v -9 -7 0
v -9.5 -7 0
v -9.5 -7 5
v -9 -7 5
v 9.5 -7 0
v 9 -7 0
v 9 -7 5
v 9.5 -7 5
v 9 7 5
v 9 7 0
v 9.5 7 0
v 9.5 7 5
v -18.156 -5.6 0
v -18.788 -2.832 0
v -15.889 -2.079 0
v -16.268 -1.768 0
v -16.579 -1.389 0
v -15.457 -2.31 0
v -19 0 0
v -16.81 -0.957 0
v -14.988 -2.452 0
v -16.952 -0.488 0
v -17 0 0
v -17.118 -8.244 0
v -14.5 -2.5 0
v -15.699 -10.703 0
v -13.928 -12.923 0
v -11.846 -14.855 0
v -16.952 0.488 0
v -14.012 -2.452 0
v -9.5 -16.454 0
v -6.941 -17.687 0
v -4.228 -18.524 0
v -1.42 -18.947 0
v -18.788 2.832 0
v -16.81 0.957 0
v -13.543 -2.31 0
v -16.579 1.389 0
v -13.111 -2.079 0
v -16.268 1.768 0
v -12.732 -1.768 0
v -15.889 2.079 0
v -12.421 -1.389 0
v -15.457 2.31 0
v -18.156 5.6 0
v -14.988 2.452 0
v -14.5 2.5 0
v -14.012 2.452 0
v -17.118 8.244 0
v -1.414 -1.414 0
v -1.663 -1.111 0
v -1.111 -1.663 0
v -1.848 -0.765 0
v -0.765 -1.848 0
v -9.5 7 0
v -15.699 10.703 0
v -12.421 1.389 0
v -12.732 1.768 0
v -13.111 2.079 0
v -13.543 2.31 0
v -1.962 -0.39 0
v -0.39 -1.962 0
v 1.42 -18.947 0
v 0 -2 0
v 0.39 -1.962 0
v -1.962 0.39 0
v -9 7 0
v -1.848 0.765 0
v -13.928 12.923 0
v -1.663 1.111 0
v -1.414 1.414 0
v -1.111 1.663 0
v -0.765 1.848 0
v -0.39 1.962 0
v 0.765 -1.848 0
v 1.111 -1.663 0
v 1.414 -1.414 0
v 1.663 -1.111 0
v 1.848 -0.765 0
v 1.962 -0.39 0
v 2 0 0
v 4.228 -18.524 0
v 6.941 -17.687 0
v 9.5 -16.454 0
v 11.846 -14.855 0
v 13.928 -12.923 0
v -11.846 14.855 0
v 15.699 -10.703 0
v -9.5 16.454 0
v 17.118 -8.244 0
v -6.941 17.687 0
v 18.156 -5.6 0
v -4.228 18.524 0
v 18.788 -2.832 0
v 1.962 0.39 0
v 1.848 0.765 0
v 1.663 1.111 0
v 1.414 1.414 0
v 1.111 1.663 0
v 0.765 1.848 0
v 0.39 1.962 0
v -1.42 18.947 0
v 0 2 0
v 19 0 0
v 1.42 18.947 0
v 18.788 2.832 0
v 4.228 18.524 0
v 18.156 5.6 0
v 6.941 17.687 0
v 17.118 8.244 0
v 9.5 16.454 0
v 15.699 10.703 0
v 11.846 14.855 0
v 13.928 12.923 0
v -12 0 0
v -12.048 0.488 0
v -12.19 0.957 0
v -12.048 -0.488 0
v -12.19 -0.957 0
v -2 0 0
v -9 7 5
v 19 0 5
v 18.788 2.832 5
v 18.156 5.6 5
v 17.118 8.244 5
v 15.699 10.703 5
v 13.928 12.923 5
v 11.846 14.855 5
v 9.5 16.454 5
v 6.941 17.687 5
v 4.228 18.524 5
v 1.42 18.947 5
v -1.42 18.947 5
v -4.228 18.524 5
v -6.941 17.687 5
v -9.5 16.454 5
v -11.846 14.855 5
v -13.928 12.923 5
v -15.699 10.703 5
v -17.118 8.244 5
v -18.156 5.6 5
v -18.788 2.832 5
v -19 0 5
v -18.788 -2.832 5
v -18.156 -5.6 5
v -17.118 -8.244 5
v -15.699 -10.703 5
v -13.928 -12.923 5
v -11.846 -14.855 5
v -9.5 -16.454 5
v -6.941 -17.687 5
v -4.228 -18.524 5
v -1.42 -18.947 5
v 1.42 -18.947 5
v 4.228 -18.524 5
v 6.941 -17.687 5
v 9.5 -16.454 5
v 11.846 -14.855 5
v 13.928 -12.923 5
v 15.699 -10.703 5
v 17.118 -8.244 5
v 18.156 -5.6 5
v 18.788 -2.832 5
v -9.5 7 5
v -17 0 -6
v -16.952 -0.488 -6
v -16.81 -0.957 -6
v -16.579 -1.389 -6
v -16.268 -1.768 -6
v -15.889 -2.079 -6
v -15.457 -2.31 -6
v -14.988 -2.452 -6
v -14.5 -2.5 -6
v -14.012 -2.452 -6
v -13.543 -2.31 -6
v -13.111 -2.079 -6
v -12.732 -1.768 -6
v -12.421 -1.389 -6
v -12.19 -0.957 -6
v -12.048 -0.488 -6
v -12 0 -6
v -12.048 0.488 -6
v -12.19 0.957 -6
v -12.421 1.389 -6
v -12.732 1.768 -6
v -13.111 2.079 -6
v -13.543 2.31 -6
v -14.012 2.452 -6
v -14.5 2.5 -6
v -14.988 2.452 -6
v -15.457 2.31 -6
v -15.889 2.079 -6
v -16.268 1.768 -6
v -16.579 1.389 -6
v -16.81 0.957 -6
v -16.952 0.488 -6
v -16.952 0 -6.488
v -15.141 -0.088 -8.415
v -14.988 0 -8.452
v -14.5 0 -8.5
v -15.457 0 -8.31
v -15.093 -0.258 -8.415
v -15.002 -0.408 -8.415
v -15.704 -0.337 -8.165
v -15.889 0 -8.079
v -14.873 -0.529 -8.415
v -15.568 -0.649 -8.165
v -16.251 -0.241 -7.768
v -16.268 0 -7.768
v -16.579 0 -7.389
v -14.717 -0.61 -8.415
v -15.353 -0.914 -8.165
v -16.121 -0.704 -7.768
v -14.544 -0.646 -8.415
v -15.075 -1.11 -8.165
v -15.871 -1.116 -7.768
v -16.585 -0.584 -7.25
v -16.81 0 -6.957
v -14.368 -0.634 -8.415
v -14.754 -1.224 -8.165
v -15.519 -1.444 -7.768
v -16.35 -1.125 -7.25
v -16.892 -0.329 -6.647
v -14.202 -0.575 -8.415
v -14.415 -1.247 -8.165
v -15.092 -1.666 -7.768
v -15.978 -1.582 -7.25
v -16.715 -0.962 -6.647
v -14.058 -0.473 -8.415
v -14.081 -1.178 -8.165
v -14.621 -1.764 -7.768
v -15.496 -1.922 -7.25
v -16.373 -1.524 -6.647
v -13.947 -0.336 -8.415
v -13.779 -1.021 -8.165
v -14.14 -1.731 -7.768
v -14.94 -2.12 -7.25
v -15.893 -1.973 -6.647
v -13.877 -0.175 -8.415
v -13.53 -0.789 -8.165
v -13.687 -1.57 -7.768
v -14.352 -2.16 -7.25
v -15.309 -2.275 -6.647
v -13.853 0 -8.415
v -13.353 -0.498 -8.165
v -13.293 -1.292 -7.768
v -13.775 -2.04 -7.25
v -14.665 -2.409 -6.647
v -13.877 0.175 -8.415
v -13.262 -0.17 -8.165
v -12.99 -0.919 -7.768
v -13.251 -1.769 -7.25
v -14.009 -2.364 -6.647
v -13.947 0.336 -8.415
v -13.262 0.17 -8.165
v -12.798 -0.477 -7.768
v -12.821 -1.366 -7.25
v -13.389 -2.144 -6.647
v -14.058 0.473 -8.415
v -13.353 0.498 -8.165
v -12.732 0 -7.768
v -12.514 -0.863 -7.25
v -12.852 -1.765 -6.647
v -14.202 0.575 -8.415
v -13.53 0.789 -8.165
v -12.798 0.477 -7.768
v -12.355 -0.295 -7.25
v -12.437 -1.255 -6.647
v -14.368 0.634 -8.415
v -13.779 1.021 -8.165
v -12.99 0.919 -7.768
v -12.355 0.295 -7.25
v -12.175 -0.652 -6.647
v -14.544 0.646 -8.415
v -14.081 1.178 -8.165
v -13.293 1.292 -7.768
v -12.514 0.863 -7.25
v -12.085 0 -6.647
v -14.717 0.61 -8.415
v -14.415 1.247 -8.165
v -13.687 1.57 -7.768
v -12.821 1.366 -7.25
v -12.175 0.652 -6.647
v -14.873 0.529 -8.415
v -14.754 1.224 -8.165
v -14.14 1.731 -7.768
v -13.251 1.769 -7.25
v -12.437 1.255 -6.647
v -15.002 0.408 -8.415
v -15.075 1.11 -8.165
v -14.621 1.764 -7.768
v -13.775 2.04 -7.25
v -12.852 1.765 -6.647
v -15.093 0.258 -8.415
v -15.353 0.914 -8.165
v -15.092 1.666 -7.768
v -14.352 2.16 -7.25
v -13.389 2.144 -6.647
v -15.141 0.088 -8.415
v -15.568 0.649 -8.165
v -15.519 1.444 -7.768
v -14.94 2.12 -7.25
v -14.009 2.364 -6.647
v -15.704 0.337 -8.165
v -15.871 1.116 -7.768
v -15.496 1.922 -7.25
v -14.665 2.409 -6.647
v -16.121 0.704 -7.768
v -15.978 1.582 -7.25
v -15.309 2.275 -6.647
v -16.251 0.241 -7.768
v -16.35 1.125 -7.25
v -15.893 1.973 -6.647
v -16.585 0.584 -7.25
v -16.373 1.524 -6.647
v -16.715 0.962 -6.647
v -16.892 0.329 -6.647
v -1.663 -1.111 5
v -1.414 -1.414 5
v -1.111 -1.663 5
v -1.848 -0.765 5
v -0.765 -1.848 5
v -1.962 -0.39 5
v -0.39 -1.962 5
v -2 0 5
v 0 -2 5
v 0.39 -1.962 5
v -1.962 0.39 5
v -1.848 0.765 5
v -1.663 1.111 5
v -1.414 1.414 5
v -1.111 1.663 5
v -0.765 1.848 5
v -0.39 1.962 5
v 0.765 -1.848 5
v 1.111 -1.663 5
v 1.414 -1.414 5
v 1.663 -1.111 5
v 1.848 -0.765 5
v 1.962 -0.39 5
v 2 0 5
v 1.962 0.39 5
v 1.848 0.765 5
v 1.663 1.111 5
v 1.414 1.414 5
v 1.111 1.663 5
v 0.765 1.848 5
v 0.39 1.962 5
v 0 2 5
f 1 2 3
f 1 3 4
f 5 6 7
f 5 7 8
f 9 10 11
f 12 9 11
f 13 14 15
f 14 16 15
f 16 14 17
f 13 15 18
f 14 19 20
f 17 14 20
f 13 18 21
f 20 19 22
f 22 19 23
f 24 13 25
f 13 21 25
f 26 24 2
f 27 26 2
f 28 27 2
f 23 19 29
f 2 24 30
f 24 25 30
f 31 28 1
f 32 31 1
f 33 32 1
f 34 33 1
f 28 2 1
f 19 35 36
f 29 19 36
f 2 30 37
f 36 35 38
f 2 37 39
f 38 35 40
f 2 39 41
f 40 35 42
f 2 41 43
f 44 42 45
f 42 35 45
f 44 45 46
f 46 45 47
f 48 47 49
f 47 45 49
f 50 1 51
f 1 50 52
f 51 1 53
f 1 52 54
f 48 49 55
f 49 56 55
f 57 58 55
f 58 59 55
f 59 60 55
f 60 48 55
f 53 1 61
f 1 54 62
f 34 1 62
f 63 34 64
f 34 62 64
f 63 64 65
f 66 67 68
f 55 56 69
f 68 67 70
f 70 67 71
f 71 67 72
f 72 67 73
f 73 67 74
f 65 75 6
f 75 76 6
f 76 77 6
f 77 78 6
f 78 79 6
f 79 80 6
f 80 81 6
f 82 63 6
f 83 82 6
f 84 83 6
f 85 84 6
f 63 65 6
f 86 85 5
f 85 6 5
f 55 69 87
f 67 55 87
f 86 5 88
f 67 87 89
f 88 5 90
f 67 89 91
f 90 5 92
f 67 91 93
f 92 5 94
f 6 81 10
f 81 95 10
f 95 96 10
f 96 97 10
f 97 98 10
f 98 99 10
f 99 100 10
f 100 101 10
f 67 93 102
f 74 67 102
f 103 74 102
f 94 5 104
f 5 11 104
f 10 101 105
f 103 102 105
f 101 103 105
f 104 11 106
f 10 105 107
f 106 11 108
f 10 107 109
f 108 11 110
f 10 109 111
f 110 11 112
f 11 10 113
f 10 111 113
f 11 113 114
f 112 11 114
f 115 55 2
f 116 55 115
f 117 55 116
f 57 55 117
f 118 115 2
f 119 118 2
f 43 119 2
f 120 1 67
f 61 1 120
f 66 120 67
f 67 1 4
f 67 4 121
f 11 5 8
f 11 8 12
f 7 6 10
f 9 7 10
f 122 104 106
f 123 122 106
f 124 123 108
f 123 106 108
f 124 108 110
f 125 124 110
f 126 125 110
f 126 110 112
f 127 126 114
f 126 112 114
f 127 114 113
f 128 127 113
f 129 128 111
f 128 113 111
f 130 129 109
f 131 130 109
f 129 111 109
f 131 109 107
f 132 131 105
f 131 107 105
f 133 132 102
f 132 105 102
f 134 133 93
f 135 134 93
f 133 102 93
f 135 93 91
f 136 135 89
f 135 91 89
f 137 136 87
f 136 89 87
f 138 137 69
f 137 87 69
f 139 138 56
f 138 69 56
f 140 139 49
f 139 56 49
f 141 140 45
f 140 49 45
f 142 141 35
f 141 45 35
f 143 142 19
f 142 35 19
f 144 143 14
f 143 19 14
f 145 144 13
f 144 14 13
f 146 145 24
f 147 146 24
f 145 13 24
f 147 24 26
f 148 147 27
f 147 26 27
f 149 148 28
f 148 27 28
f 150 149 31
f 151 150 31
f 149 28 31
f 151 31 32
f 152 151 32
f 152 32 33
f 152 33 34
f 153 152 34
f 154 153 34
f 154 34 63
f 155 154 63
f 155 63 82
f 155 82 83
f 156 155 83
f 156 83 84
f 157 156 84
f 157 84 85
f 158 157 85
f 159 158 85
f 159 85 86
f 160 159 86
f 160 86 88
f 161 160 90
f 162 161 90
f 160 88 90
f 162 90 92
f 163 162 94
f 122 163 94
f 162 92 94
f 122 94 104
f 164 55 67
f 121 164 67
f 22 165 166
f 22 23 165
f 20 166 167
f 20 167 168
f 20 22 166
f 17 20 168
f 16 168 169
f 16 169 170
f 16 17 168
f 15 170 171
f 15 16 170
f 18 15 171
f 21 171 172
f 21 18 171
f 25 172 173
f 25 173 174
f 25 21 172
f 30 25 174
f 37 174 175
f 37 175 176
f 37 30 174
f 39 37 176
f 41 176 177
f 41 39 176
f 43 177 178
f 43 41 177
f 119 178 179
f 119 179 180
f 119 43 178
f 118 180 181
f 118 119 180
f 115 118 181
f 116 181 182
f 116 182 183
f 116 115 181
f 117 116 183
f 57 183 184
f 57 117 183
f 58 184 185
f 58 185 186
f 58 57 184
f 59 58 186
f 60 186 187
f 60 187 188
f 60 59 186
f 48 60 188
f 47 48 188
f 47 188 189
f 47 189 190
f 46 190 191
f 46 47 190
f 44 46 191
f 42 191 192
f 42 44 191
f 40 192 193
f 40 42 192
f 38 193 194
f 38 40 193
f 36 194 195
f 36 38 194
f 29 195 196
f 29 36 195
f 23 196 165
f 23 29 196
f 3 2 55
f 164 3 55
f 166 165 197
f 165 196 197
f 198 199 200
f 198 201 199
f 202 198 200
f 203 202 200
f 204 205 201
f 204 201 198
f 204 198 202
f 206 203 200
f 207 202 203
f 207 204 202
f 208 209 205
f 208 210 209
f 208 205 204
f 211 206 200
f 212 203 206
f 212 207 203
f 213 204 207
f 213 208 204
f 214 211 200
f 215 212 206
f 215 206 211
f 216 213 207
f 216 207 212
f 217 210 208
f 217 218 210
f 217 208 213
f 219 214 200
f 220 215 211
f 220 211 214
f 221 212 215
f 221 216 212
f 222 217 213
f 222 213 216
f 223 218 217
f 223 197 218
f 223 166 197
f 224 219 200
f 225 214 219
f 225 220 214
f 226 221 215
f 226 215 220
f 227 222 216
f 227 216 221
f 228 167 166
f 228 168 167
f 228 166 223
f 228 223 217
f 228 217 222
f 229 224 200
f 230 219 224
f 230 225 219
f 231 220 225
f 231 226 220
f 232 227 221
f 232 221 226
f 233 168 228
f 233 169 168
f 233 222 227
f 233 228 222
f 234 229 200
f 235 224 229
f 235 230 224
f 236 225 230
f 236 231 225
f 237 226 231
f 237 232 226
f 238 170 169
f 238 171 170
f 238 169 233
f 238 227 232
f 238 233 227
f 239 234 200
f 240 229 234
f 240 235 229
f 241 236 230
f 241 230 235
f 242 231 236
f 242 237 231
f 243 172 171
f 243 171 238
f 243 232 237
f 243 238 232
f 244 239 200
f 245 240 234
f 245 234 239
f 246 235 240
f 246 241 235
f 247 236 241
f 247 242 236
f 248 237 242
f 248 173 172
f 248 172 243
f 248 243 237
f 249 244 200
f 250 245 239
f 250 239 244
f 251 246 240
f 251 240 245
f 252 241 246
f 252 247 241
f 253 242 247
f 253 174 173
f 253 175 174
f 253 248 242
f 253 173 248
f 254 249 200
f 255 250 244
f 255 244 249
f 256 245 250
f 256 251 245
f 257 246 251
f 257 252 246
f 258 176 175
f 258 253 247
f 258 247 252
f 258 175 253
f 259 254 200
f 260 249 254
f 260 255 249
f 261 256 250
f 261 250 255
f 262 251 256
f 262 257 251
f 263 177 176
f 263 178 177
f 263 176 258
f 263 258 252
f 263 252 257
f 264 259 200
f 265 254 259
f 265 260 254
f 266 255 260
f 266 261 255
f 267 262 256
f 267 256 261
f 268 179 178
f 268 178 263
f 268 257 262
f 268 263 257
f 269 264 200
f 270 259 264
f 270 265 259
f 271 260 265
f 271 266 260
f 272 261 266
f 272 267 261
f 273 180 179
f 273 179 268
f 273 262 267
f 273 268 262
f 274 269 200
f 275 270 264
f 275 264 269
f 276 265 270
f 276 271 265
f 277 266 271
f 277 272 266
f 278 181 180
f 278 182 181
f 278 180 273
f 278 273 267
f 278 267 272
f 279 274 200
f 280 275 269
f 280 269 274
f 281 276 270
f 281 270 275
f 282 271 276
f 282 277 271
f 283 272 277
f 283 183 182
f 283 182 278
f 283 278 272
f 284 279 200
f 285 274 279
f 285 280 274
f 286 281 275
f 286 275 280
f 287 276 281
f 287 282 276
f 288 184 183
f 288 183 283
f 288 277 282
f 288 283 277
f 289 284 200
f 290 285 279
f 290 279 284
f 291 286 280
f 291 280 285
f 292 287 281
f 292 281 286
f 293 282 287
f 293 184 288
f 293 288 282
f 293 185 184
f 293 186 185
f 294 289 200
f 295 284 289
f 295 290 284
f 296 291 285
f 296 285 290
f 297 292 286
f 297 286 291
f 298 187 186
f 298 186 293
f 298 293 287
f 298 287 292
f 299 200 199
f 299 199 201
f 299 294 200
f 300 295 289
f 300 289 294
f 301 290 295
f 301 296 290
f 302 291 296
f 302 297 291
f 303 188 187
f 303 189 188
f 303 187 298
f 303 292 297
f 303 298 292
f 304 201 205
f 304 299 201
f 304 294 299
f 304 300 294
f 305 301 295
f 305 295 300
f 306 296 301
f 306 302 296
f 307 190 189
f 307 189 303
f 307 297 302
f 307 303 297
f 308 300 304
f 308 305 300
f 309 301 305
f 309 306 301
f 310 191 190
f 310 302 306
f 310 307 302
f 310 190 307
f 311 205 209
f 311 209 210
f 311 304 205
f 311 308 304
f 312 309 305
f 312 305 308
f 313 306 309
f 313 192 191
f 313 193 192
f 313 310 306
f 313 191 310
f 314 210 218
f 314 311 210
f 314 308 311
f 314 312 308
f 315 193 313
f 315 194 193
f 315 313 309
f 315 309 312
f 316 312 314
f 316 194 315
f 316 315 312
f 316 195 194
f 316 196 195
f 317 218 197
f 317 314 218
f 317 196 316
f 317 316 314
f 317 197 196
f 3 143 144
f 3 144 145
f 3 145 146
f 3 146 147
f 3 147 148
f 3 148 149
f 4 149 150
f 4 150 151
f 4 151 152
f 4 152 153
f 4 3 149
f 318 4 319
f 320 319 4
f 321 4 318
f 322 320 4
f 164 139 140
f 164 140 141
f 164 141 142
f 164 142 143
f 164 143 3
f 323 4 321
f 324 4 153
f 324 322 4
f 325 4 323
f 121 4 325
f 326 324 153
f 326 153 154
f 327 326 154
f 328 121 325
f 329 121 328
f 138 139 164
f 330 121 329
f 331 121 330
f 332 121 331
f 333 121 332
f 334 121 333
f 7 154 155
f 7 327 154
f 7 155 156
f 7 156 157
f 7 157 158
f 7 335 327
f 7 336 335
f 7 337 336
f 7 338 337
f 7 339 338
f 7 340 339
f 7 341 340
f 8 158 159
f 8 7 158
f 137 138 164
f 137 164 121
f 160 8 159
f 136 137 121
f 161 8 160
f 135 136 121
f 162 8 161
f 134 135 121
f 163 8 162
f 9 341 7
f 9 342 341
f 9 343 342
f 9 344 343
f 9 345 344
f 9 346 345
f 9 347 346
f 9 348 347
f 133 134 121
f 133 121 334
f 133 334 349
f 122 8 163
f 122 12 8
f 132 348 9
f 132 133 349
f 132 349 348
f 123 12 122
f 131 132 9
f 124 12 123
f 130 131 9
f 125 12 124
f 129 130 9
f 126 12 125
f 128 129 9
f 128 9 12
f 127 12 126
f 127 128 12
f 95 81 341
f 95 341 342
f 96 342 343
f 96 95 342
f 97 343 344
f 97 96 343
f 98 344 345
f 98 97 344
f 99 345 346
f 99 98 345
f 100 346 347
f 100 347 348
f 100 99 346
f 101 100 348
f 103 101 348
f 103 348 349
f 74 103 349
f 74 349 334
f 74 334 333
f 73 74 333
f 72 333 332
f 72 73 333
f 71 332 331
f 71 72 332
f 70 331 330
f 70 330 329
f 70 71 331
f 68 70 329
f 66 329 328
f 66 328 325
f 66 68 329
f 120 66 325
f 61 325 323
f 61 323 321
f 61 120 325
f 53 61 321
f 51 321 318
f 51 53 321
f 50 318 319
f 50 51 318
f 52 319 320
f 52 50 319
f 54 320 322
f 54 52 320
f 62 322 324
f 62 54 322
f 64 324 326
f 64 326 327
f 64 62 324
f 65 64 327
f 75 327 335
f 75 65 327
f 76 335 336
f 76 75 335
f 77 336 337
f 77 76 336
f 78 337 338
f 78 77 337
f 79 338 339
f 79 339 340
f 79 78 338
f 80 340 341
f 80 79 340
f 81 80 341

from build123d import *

# Parameters (mm, degrees)
SKETCH1_R           = 19
SKETCH1_R_2         = 2
SKETCH1_W           = 0.5
SKETCH1_H           = 14
BOSS_EXTRUDE1_DEPTH = 5


with BuildPart() as part:
    # Sketch1 → Boss-Extrude1 (new body)
    with BuildSketch(Plane.XY):
        Circle(SKETCH1_R)
        Circle(SKETCH1_R_2, mode=Mode.SUBTRACT)
        with Locations((-9.25, 0)):
            Rectangle(SKETCH1_W, SKETCH1_H, mode=Mode.SUBTRACT)
        with Locations((9.25, 0)):
            Rectangle(SKETCH1_W, SKETCH1_H, mode=Mode.SUBTRACT)
    extrude(amount=BOSS_EXTRUDE1_DEPTH)

    # Sketch3 → Revolve1 (revolve)
    with BuildSketch(Plane(origin=(0, 0, 0), x_dir=(1, 0, 0), z_dir=(0, 1, 0))):
        with BuildLine():
            Line((-17, 6), (-17, 0))
            Line((-17, 0), (-14.5, 0))
            Line((-14.5, 0), (-14.5, 8.5))
            ThreePointArc((-14.5, 8.5), (-16.267766953, 7.767766953), (-17, 6))
        make_face()
    revolve(axis=Axis((-14.5, 0, -6), (0, 0, 1)))


solid = part.part
